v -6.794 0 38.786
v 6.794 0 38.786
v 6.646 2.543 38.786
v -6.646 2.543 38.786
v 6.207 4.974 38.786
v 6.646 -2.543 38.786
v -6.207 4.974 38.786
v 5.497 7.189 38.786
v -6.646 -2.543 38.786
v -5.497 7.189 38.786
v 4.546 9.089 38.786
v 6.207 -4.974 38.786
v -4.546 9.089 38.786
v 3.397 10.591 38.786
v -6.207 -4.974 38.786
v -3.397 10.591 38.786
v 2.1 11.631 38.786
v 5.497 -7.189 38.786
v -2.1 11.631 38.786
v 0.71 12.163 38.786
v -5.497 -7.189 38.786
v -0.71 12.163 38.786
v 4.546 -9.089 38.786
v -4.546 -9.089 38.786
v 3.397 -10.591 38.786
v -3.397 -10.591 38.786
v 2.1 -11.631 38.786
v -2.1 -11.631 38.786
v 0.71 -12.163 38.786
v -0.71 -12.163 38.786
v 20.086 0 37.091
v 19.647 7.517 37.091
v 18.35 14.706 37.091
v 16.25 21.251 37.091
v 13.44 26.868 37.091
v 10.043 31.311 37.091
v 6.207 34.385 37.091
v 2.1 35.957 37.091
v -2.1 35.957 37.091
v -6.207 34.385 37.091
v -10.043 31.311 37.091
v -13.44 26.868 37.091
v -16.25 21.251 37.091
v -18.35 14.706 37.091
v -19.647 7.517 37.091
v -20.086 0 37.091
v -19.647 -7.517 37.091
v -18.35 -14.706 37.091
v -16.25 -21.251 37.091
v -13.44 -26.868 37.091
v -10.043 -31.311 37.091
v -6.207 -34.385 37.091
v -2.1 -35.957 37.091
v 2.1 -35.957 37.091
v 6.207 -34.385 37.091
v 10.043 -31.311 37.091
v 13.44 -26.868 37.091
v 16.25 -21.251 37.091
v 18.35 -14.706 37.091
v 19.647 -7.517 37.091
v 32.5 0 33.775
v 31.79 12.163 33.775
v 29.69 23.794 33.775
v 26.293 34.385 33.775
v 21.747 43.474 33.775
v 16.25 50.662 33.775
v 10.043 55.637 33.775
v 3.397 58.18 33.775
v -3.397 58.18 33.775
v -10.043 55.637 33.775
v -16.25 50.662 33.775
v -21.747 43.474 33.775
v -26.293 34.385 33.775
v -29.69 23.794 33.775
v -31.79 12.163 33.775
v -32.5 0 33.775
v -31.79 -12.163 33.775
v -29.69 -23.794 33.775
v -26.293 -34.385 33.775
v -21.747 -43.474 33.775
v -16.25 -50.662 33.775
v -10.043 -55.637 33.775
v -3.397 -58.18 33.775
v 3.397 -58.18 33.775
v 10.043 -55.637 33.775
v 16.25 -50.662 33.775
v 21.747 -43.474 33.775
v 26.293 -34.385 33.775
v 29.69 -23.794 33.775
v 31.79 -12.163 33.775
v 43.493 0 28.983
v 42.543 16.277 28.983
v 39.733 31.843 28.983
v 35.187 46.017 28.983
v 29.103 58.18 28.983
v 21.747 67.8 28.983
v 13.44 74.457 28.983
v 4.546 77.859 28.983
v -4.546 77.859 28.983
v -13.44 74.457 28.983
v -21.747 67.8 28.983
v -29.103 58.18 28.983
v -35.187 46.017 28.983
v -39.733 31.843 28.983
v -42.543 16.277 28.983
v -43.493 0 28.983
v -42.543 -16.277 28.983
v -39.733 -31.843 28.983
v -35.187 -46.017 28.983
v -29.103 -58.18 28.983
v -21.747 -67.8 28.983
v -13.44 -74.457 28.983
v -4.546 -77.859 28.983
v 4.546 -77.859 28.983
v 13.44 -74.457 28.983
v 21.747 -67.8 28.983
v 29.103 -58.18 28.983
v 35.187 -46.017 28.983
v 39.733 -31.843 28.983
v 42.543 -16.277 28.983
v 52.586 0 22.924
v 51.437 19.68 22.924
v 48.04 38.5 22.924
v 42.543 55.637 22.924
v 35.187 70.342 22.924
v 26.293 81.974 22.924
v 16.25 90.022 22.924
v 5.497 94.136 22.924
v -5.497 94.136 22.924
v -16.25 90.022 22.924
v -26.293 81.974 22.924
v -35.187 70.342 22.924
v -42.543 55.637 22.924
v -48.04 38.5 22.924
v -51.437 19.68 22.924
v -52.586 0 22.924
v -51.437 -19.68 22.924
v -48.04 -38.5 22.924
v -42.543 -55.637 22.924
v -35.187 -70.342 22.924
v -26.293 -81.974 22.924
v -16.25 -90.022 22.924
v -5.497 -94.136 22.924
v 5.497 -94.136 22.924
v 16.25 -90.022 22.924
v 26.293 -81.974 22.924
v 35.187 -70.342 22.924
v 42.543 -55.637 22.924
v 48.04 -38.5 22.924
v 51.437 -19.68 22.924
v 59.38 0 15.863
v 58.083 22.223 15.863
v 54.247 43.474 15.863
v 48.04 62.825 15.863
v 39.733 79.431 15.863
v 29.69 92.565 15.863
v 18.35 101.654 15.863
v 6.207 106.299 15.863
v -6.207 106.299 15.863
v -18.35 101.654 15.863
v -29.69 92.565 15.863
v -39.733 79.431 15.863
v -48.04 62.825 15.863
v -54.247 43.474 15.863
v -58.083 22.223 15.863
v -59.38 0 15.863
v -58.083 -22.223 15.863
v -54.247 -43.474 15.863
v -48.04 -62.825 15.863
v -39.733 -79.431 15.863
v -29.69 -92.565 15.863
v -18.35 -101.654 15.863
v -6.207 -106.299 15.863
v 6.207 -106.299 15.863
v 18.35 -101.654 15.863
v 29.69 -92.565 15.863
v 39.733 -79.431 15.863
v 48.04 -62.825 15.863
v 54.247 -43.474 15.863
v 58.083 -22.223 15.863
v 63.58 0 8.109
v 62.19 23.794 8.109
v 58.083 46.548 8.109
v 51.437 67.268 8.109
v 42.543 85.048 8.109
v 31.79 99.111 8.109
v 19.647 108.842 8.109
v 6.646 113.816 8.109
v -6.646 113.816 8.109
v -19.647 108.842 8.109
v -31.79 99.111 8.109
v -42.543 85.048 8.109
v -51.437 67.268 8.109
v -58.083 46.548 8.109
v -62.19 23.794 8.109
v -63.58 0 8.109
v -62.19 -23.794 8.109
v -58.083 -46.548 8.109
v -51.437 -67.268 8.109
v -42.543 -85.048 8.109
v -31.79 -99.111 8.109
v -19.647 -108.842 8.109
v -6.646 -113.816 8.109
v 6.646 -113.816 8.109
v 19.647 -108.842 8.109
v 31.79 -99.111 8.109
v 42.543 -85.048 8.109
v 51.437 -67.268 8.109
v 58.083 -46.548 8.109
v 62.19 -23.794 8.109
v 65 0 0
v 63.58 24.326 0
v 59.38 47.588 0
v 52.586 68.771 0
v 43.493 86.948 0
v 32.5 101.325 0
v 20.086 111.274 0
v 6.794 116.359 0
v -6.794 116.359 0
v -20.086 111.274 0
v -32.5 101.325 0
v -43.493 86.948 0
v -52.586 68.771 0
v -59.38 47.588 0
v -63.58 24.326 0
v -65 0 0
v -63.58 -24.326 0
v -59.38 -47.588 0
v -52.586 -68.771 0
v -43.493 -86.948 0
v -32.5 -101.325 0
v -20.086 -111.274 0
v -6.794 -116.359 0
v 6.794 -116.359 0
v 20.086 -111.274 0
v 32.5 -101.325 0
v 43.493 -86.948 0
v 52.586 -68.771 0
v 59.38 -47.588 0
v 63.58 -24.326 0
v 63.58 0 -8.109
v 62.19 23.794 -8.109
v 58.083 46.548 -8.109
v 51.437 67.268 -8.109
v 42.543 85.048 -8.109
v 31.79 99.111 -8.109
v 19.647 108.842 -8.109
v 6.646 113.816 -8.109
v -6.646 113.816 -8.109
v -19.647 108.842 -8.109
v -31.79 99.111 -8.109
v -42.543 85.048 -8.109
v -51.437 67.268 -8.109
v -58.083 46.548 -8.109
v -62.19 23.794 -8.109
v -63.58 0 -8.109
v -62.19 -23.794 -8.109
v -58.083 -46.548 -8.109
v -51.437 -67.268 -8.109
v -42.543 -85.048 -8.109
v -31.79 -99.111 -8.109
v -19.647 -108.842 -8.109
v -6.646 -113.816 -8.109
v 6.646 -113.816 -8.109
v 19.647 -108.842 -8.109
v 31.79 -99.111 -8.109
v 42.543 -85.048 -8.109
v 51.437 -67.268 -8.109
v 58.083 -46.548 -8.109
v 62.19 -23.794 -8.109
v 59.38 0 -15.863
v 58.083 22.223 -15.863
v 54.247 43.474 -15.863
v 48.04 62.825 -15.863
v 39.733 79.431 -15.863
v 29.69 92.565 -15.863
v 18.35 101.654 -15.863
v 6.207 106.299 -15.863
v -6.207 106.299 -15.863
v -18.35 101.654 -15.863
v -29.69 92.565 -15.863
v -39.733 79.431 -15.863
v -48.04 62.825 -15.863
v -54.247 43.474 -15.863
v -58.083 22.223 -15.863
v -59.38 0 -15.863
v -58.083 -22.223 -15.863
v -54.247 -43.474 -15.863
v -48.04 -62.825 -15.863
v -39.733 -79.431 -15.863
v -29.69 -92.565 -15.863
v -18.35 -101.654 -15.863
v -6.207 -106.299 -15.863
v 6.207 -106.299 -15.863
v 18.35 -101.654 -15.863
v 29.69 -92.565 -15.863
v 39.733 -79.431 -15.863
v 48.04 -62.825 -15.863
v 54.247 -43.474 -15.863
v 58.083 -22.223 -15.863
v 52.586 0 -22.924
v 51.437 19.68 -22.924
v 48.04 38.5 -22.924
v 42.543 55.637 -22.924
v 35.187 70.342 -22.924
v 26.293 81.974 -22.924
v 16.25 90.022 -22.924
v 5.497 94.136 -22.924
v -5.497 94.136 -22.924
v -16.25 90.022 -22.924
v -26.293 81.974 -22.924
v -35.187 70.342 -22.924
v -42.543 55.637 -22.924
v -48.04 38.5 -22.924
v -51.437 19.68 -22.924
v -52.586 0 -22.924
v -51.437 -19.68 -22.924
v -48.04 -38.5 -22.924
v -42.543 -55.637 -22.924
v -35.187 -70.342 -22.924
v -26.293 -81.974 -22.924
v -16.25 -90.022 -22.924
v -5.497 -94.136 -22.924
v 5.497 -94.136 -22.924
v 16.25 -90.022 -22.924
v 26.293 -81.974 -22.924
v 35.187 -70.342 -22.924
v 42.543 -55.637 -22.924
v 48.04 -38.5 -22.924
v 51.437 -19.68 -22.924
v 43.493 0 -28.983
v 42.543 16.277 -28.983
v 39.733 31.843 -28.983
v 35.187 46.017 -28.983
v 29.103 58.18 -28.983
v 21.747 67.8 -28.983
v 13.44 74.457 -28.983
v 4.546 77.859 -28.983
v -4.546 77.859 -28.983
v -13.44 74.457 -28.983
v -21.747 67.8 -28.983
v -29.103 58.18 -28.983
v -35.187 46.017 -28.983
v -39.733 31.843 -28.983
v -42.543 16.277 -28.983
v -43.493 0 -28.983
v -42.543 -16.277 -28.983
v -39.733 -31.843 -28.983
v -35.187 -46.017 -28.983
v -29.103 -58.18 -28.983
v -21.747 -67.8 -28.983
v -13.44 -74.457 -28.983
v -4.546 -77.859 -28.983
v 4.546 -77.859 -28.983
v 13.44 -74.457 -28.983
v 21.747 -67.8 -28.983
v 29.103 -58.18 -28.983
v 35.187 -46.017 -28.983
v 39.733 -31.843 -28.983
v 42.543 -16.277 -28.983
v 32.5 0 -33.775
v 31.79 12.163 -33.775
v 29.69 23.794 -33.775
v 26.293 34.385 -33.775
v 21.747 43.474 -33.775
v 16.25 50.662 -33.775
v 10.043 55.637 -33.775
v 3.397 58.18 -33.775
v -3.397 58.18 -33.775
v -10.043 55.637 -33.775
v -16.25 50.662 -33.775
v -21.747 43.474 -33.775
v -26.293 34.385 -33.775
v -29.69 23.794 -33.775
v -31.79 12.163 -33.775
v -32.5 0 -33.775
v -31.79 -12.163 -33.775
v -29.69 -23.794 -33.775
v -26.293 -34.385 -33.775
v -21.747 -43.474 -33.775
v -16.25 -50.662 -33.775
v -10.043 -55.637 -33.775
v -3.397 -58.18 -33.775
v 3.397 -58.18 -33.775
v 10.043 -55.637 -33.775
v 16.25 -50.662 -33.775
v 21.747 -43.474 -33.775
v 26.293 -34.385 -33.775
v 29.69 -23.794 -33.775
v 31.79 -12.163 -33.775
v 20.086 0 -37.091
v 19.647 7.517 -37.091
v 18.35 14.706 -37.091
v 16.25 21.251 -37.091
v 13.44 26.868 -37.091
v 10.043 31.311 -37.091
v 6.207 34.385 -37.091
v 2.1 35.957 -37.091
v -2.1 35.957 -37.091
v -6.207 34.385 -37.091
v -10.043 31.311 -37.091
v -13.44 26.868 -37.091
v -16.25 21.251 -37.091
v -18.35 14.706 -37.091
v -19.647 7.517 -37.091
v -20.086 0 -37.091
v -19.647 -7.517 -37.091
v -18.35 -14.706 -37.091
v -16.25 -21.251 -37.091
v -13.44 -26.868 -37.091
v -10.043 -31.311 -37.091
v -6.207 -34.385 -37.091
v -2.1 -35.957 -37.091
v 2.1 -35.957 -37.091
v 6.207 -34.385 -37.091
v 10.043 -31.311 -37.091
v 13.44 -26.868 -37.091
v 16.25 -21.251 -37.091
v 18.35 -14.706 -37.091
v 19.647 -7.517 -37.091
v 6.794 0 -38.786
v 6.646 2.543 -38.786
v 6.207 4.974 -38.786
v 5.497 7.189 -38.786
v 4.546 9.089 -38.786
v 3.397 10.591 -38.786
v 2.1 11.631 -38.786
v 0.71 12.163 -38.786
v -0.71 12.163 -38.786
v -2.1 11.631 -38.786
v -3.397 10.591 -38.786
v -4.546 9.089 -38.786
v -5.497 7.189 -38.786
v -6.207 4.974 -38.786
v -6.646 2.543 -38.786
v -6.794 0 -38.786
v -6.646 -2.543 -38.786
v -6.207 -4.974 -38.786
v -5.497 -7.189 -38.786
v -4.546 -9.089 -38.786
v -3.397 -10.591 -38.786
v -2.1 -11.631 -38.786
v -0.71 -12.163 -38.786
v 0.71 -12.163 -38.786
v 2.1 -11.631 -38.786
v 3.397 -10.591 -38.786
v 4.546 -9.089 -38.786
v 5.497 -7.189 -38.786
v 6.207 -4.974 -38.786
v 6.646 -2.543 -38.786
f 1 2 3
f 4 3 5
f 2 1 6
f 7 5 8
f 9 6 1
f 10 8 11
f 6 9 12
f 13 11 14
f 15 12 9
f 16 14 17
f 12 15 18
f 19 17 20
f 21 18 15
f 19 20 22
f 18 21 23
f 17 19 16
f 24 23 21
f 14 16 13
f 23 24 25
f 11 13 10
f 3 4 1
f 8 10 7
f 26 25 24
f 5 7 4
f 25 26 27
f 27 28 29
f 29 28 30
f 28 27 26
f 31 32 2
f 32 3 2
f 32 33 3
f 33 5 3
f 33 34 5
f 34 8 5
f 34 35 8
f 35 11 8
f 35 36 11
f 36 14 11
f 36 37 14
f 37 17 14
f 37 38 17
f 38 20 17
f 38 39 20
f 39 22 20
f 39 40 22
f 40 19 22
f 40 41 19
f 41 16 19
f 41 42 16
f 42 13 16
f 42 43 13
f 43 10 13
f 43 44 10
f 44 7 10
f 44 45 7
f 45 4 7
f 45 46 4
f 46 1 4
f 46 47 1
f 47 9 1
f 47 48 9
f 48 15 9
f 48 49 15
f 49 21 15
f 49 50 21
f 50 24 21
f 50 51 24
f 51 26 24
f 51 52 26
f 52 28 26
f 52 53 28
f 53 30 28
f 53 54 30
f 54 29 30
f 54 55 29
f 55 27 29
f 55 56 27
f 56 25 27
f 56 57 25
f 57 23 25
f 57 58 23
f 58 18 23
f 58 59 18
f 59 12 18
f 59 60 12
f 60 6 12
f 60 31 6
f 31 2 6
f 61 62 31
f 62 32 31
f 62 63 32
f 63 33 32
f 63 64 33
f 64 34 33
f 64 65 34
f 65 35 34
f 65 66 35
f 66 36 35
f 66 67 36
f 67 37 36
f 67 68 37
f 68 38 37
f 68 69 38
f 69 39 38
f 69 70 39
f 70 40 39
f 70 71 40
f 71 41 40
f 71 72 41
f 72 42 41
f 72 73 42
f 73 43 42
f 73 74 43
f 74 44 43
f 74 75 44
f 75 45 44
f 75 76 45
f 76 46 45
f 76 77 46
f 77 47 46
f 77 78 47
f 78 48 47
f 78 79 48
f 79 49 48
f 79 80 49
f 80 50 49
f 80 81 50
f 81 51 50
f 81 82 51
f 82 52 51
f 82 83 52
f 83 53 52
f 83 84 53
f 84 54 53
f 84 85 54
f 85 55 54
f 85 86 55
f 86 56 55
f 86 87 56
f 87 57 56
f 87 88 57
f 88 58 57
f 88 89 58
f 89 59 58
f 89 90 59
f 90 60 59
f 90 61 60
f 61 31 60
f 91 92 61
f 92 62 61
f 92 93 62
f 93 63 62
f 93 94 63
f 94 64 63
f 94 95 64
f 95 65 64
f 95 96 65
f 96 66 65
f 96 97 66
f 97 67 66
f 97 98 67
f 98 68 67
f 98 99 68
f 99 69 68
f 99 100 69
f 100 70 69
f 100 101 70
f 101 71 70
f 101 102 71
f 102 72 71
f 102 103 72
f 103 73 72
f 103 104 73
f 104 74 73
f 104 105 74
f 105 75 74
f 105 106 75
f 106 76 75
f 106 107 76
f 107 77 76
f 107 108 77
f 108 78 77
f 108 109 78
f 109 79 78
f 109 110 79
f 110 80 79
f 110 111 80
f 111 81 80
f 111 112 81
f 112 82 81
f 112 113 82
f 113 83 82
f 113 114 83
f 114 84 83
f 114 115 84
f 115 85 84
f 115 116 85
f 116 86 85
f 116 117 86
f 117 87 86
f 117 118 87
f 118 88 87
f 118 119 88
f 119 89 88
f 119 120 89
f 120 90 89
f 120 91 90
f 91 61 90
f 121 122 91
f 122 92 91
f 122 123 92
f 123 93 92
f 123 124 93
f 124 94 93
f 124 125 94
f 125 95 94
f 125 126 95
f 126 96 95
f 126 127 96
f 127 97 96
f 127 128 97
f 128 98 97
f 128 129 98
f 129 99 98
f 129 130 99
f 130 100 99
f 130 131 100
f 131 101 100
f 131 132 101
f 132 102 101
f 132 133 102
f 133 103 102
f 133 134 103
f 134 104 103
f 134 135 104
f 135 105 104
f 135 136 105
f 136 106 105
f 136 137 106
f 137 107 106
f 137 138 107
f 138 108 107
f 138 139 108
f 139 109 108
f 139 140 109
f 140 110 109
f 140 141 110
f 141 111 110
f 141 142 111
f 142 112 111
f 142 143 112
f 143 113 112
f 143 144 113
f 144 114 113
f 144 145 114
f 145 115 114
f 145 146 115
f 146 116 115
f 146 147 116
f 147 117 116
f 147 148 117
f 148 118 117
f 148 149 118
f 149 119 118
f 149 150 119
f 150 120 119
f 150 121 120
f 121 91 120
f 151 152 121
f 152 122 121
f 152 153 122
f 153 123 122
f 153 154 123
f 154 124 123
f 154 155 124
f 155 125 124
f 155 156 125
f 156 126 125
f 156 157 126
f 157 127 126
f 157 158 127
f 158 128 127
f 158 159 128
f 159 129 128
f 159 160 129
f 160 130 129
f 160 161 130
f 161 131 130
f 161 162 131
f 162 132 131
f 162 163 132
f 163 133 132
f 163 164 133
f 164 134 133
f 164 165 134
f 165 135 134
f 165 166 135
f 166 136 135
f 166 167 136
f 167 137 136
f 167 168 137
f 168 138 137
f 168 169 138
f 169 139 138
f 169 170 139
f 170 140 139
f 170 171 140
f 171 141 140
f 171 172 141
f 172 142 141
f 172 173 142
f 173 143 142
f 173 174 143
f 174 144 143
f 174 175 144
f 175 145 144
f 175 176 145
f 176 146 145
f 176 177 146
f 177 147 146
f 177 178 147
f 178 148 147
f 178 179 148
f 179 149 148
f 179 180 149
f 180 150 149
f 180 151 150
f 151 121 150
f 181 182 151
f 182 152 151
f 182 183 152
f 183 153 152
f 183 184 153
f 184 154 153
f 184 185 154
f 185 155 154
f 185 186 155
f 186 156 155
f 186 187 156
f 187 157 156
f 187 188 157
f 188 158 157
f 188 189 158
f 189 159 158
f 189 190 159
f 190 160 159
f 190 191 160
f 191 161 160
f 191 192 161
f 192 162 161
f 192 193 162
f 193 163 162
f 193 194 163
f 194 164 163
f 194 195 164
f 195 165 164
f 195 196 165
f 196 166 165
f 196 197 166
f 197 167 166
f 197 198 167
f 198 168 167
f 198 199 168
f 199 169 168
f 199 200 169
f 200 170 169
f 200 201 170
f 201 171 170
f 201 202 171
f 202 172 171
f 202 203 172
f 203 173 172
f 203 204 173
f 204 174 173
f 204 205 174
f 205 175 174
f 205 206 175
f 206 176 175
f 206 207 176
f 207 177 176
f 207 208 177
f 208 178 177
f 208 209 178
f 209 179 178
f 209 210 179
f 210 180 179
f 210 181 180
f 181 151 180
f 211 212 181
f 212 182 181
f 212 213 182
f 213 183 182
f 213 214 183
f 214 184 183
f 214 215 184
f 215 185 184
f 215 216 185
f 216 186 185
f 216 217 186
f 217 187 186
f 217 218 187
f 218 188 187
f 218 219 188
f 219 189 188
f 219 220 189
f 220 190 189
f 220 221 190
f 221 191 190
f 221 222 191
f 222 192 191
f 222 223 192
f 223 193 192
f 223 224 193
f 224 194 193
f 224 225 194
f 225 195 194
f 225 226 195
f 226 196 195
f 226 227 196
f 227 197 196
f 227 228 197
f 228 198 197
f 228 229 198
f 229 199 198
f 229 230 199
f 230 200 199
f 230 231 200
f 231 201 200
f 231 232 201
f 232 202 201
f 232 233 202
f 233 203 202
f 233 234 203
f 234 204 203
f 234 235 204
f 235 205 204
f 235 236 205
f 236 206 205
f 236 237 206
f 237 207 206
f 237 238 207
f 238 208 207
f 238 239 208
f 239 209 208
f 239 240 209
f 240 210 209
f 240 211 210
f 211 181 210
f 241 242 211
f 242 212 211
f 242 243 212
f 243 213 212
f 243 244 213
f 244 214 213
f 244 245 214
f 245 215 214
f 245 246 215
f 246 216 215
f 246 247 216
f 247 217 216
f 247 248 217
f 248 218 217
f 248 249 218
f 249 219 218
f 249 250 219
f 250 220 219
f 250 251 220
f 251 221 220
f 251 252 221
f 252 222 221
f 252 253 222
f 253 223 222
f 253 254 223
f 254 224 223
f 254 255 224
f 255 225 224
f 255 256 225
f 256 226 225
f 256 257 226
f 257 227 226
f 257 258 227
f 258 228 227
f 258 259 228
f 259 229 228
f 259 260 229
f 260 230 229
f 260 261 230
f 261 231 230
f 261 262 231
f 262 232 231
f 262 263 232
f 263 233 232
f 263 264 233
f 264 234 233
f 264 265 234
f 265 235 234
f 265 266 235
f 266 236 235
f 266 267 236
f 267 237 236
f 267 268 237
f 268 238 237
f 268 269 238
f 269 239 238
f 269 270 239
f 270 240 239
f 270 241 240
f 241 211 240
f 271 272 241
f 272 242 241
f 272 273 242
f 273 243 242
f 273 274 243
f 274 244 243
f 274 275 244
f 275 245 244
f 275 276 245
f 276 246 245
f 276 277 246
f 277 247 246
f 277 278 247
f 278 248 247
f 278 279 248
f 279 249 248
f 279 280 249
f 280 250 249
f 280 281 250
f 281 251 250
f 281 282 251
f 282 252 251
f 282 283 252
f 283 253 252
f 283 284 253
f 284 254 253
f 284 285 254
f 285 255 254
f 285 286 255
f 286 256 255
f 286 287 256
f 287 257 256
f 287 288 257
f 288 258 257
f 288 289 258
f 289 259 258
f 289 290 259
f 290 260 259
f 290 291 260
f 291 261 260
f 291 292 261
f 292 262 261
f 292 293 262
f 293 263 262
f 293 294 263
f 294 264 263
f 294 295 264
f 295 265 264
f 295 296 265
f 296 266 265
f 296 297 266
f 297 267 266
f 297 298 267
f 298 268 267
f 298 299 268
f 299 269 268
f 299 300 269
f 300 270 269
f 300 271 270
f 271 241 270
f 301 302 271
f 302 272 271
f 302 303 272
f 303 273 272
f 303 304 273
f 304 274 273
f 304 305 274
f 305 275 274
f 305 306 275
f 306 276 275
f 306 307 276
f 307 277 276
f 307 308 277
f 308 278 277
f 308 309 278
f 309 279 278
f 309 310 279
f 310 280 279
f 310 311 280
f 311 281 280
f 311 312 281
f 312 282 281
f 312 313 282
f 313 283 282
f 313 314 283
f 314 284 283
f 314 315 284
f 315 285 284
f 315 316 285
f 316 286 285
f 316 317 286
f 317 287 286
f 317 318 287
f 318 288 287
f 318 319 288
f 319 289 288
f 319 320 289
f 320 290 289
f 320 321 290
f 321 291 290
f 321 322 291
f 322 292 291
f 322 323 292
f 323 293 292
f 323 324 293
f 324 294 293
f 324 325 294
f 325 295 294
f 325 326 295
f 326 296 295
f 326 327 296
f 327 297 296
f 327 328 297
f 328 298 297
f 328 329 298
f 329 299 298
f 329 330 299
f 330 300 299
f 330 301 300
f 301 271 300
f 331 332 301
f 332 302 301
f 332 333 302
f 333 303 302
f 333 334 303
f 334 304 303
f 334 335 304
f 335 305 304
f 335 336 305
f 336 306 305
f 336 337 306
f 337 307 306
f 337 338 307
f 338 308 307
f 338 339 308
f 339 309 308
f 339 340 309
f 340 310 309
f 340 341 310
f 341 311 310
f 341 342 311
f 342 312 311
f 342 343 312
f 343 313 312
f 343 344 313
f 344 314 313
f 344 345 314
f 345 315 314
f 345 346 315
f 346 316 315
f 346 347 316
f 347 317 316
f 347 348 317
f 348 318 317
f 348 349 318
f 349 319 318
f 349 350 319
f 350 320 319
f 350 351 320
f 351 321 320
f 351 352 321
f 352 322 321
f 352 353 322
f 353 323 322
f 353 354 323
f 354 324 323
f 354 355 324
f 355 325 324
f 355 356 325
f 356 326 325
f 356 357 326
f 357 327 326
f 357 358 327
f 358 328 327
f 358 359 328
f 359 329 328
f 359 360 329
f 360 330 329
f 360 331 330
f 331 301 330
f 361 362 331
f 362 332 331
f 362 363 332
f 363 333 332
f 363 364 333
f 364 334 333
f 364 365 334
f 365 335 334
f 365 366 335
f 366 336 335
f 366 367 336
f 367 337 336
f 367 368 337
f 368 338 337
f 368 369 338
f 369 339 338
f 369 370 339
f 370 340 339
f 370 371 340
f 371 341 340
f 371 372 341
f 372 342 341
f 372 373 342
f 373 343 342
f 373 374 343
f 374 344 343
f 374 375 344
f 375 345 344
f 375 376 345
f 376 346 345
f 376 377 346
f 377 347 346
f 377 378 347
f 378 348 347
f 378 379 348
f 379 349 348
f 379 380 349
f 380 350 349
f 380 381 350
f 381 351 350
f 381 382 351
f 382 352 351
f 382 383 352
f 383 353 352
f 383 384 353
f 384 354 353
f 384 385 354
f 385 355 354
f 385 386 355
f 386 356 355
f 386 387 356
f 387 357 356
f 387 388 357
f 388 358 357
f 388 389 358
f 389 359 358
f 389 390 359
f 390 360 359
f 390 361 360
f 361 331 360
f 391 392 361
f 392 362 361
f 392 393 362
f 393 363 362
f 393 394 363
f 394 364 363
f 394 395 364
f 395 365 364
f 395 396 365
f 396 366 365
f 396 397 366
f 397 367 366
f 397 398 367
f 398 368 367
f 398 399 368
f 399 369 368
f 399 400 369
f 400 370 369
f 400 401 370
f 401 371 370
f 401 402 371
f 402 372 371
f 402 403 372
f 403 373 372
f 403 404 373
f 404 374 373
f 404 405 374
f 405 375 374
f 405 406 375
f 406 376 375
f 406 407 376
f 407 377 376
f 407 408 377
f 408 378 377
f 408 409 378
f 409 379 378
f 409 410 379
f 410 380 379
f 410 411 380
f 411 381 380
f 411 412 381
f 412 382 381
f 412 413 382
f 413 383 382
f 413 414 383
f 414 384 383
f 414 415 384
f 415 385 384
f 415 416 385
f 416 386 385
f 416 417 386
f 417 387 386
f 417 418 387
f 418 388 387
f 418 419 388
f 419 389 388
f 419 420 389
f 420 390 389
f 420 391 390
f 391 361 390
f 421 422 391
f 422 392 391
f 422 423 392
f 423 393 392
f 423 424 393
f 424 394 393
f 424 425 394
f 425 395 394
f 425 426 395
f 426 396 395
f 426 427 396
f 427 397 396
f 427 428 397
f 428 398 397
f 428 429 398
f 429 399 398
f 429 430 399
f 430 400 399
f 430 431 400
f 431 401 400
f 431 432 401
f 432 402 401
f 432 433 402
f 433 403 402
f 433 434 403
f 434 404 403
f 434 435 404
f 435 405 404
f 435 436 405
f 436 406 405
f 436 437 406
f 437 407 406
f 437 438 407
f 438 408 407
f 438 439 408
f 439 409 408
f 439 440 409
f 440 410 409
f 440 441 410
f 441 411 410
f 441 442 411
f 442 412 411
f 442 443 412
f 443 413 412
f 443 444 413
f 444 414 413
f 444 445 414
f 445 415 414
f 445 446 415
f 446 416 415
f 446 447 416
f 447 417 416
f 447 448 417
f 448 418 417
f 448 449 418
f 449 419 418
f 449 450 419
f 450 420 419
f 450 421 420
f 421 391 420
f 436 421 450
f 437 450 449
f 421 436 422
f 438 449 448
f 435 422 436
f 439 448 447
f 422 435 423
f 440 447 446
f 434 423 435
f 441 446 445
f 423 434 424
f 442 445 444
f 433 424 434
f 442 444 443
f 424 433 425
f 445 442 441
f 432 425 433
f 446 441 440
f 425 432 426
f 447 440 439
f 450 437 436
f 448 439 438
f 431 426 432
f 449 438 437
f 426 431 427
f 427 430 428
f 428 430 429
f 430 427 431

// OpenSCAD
// Generated by SolidPython 1.0.1 on 2020-07-29 00:46:46


scale(v = [5, 9, 3]) {
	sphere(r = 13);
}
/***********************************************
*********      SolidPython code:      **********
************************************************
 
# import packages: SolidPython
from solid import *
from solid.utils import *
from itertools import chain, combinations, permutations


class Resize:

    def __init__(self, scad_file):
        self.scad_file = scad_file
        #self.scad_file = import_scad(scad_file)
        # cone/cylinder param:
        self.r1 = 0
        self.r2 = 0
        self.h = 0
        # rectangular prism param:
        self.w = 0
        self.l = 0
        # ellipse param:
        self.r = 0

    # import OpenScad code (file name corresponds to shape)


    # classify shape + parameters
    def assign(self, param1, param2, param3):
        if self.scad_file == 'cone.scad':
            self.r1 = param1
            self.r2 = param2
            self.h = param3
        elif self.scad_file == 'cylinder.scad':
            self.r1 = param1
            self.r2 = param2
            self.h = param3
        elif self.scad_file == 'rectangularPrism.scad':
            self.h = param1
            self.l = param2
            self.w = param3
        else:
            self.r = param1
            self.h = param2

    # resize parameters
    def iterate(self):
        x = range(3, 20, 2)
        i = 1
        if self.scad_file == 'cone.scad':
            tempList = list(permutations(x, 2))
            for temp in tempList:
                param1 = temp[0]
                param2 = temp[1]
                filepath = 'produced_scad_files/' + 'cone' + str(param1) + '_' + str(param2) + '_' + '.scad'
                scad_render_to_file(cylinder(h=param1, r1=param2, r2=0), filepath)

        elif self.scad_file == 'cylinder.scad':
            tempList = list(permutations(x, 3))
            for temp in tempList:
                param1 = temp[0]
                param2 = temp[1]
                filepath = 'produced_scad_files/' + 'cylinder' + str(param1) + '_' + str(param2) + '_' + '.scad'
                scad_render_to_file(cylinder(h=param1, r1=param2, r2=param2), filepath)

        elif self.scad_file == 'rectangularPrism.scad':
            tempList = list(permutations(x, 3))
            for temp in tempList:
                param1 = temp[0]
                param2 = temp[1]
                param3 = temp[2]
                filepath = 'produced_scad_files/' + 'rectangularPrism' + str(param1) + '_' + str(param2) + '_' + str(
                    param3) + '.scad'
                scad_render_to_file(cube(size=(param1, param2, param3)), filepath)

        elif self.scad_file == 'ellipse.scad':
            tempList = list(permutations(x, 4))
            for temp in tempList:
                param1 = temp[0]
                param2 = temp[1]
                param3 = temp[2]
                param4 = temp[3]
                filepath = 'produced_scad_files/' + 'ellipse' + str(param1) + '_' + str(param2) + '_' + str(param3) + '_' + str(param4) + '.scad'
                scad_render_to_file(scale([param1, param2, param3])(sphere(r=param4)), filepath)

    def render_to_scadfile(self):
        scad_render_to_file(scad, 'example.scad') 
 
************************************************/
